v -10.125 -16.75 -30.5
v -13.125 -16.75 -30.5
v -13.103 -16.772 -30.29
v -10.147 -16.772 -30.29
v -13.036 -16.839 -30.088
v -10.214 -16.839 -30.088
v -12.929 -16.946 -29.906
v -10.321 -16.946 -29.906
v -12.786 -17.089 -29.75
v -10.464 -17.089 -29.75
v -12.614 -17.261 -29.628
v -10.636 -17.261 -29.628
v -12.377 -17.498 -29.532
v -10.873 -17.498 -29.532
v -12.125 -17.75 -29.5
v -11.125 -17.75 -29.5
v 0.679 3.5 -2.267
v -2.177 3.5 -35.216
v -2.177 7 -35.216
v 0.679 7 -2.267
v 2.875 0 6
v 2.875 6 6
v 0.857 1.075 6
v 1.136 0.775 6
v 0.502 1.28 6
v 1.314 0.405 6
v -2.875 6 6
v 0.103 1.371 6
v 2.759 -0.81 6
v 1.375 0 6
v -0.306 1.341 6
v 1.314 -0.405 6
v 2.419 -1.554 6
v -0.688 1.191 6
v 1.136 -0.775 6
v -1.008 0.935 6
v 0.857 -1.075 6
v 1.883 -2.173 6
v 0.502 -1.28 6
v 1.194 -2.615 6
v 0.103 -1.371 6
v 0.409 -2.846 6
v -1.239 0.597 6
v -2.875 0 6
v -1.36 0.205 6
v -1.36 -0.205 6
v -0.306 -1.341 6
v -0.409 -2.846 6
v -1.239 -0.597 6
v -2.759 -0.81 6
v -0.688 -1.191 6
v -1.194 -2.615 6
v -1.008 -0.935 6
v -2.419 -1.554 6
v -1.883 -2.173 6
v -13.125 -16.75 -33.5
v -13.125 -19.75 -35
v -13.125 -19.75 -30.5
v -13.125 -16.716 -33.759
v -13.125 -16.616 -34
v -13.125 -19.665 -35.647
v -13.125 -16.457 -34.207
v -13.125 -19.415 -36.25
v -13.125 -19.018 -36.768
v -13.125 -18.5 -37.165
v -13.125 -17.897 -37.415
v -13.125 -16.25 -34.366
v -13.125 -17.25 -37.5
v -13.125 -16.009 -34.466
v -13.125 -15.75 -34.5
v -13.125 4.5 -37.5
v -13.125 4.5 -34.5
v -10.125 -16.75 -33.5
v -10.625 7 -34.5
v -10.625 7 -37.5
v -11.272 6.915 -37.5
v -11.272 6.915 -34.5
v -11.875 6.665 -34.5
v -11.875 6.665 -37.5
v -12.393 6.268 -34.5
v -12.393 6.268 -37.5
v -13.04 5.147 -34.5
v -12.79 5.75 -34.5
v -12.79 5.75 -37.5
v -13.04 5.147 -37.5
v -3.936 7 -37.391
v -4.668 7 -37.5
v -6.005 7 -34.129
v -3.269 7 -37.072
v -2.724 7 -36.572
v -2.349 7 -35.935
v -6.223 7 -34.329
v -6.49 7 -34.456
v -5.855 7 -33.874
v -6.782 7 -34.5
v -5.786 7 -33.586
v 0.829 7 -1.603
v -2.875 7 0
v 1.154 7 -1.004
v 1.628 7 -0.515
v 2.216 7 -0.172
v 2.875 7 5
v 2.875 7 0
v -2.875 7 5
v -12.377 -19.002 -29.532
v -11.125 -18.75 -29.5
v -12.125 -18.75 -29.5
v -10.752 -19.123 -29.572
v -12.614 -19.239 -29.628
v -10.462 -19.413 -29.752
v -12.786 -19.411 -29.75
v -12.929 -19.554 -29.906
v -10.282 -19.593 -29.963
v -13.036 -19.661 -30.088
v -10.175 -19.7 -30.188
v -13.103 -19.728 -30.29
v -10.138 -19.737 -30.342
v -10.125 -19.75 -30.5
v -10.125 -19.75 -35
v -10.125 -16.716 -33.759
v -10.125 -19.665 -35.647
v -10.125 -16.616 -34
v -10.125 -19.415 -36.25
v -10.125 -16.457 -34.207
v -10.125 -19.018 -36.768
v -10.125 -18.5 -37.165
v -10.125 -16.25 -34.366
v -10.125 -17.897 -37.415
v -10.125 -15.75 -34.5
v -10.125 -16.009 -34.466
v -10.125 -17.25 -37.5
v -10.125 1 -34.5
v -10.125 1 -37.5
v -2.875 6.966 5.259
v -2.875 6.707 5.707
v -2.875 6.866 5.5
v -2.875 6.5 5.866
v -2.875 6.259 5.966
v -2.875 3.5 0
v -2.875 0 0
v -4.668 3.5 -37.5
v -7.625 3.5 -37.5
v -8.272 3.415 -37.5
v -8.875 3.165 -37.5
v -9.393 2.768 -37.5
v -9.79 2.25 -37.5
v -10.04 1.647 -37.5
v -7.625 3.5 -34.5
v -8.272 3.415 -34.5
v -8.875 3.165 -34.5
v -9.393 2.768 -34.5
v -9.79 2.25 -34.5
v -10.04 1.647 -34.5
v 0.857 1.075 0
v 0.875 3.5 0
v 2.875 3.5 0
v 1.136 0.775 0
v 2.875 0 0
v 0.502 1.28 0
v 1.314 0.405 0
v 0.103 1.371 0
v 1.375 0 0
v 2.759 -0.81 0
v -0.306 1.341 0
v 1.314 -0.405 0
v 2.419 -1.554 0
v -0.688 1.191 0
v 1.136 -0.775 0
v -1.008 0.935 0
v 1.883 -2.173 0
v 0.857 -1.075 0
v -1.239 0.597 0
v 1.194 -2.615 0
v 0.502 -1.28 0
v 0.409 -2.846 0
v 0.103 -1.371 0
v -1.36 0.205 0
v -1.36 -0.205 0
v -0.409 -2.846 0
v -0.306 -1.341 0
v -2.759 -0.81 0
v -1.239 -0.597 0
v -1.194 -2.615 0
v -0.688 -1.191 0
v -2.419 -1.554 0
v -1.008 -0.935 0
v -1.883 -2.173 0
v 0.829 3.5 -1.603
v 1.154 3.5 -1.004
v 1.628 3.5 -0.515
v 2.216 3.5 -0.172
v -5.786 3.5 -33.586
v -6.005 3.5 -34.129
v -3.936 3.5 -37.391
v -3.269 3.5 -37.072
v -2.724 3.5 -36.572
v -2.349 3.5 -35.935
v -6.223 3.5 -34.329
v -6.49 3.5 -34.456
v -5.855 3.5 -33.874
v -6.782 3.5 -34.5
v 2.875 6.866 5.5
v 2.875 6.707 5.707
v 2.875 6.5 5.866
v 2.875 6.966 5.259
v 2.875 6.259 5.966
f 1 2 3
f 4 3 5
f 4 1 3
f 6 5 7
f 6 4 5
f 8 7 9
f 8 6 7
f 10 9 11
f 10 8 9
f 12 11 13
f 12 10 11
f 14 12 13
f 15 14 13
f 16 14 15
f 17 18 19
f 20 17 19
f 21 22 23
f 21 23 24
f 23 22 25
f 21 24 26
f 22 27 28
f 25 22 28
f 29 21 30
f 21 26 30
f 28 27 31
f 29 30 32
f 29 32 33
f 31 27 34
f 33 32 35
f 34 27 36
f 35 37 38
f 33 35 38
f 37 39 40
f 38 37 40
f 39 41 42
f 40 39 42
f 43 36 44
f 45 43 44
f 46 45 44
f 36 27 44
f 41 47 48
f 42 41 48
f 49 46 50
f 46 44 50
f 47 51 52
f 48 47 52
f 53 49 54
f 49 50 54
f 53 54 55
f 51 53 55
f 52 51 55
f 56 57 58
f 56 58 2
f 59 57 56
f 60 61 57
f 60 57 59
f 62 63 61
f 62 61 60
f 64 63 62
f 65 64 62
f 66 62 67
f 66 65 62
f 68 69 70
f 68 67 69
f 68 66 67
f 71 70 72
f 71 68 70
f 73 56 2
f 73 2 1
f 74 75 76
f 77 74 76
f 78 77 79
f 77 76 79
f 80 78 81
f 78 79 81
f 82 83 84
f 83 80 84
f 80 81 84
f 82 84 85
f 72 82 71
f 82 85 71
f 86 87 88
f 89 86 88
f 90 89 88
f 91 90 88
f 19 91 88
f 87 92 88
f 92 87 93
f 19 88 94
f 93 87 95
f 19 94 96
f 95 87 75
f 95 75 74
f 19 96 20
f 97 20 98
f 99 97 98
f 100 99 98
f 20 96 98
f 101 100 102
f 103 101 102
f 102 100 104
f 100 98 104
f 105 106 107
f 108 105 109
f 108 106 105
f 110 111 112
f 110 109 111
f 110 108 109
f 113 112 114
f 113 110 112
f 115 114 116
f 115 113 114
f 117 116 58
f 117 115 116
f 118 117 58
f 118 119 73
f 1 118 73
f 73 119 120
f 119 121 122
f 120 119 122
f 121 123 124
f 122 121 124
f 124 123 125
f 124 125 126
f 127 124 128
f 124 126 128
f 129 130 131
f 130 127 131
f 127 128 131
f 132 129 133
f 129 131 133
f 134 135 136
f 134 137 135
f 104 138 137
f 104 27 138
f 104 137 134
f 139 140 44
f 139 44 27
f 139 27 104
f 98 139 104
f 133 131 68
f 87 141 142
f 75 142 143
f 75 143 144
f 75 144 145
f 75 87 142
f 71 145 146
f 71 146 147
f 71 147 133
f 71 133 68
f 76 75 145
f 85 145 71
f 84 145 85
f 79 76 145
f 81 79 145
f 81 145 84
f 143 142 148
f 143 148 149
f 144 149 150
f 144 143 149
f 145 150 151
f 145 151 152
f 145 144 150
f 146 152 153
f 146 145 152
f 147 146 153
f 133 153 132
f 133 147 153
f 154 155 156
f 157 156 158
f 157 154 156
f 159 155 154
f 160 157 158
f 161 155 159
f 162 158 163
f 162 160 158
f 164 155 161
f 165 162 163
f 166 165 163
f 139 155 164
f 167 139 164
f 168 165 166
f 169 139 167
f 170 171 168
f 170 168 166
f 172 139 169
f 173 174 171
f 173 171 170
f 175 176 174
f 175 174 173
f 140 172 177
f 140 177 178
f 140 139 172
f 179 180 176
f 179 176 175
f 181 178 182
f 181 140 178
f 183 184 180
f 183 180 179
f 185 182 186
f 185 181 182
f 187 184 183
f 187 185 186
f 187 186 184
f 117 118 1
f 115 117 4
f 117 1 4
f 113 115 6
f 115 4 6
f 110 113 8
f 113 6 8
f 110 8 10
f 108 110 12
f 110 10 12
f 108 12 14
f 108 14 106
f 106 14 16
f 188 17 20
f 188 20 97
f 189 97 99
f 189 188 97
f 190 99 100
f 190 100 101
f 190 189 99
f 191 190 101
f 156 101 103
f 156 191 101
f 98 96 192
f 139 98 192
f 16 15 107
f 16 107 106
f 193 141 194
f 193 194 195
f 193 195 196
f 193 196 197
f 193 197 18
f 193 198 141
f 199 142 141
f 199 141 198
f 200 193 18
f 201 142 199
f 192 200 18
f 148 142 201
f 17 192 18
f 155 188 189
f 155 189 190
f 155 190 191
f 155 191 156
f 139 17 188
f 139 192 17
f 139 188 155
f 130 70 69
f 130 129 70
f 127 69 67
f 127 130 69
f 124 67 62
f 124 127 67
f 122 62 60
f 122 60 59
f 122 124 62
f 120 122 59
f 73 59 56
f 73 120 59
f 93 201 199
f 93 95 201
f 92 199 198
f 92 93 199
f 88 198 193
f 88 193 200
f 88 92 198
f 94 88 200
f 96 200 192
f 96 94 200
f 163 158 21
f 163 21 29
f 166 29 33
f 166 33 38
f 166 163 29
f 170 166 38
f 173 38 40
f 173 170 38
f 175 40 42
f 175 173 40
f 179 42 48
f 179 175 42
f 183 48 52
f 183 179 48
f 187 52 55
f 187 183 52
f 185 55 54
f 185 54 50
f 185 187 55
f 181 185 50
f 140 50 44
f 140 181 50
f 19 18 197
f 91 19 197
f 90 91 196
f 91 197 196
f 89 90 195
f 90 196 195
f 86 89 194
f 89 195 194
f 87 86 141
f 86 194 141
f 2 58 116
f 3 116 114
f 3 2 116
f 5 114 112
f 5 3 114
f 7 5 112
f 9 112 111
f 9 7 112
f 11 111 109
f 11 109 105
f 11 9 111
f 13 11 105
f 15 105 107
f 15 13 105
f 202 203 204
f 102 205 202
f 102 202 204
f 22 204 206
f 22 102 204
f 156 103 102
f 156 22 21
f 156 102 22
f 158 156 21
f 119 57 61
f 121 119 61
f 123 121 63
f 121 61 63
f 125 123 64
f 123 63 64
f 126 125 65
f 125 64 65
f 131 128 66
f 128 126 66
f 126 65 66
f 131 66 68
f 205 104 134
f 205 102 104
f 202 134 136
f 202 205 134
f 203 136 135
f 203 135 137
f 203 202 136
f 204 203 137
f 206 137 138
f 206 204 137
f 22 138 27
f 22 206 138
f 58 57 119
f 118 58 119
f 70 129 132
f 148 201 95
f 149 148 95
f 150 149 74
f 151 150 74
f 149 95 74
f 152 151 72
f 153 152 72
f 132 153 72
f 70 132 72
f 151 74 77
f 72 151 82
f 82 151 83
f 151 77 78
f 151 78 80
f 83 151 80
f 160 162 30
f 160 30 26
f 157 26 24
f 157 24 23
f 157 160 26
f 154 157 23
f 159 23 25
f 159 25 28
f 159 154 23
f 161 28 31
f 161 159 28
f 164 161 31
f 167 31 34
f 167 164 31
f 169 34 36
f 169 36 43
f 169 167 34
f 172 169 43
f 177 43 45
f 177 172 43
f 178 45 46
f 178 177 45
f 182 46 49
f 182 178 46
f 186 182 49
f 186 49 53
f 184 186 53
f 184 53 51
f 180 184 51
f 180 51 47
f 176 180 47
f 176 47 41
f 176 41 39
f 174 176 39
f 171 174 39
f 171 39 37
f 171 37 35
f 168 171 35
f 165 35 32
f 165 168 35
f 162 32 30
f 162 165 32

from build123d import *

# Parameters (mm, degrees)
SKETCH1_R           = 1.375
BOSS_EXTRUDE1_DEPTH = 6
BOSS_EXTRUDE2_START = -13.125
SKETCH9_W           = 3.5
SKETCH9_H           = 3
BOSS_EXTRUDE2_DEPTH = 7.26
BOSS_EXTRUDE3_START = -26.75
SKETCH10_W          = 3
SKETCH10_H          = 3
BOSS_EXTRUDE3_DEPTH = 23.25
SKETCH11_W          = 3
SKETCH11_H          = 3
BOSS_EXTRUDE4_DEPTH = 5
FILLET1_R           = 2.5
FILLET2_R           = 1


with BuildPart() as part:
    # Sketch1 → Boss-Extrude1 (new body)
    with BuildSketch(Plane(origin=(0, 0, 0), x_dir=(0, 1, 0), z_dir=(0, 0, 1))):
        with BuildLine():
            Line((0, 2.875), (7, 2.875))
            Line((7, 2.875), (7, -2.875))
            Line((7, -2.875), (0, -2.875))
            ThreePointArc((0, -2.875), (-2.875, 0), (0, 2.875))
        make_face()
        with Locations(Location((0, 0, 0), (0, 0, 270))):
            Circle(SKETCH1_R, mode=Mode.SUBTRACT)
    extrude(amount=BOSS_EXTRUDE1_DEPTH)

    # Sketch2 → Loft1 section 0
    with BuildSketch(Plane(origin=(0, 0, 0), x_dir=(1, 0, 0), z_dir=(0, 0, -1))):
        with BuildLine():
            Line((0.875, -7), (-2.875, -7))
            Line((-2.875, -7), (-2.875, -3.5))
            Line((-2.875, -3.5), (0.875, -3.5))
            Line((0.875, -3.5), (0.875, -7))
        make_face()
    # Sketch8 → Loft1 section 1
    with BuildSketch(Plane(origin=(0, 0, -37.5), x_dir=(-1, 0, 0), z_dir=(0, 0, -1))):
        with BuildLine():
            Line((2.375, 3.5), (2.375, 7))
            Line((2.375, 7), (6.125, 7))
            Line((6.125, 7), (6.125, 3.5))
            Line((6.125, 3.5), (2.375, 3.5))
        make_face()
    loft()

    # Sketch9 → Boss-Extrude2 (add)
    with BuildSketch(Plane.YZ.offset(BOSS_EXTRUDE2_START)):
        with Locations((5.25, -36)):
            Rectangle(SKETCH9_W, SKETCH9_H)
    extrude(amount=BOSS_EXTRUDE2_DEPTH)

    # Sketch10 → Boss-Extrude3 (add)
    with BuildSketch(Plane(origin=(0, 7, 0), x_dir=(-1, 0, 0), z_dir=(0, 1, 0)).offset(BOSS_EXTRUDE3_START)):
        with Locations((11.625, -36)):
            Rectangle(SKETCH10_W, SKETCH10_H)
    extrude(amount=BOSS_EXTRUDE3_DEPTH)

    # Sketch11 → Boss-Extrude4 (add)
    with BuildSketch(Plane.XY.offset(-34.5)):
        with Locations((-11.625, -18.25)):
            Rectangle(SKETCH11_W, SKETCH11_H)
    extrude(amount=BOSS_EXTRUDE4_DEPTH)

    # Fillet1
    # the kernel refuses this fillet: 2.5 mm, written as the material it adds along each edge
    with BuildSketch(Plane(origin=(-10.125, 3.5, -37.5), x_dir=(1, 0, 0), z_dir=(0, 0, 1))) as fillet1_piece_1:
        with BuildLine():
            CenterArc((FILLET1_R, -FILLET1_R), FILLET1_R, 90, 90)
            Line((0, -FILLET1_R), (0, 0))
            Line((0, 0), (FILLET1_R, 0))
        make_face()
    extrude(amount=3)
    with BuildSketch(Plane(origin=(0.875, 3.5, 0), x_dir=(-0.08634300732914678, 0, -0.9962654691824658), z_dir=(0, 1, 0))) as fillet1_piece_2:
        with BuildLine():
            CenterArc((2.275267243, -2.5), FILLET1_R, 90, 78.288278187)
            Line((-0.172686015, -1.992530938), (0, 0))
            Line((0, 0), (2.275267243, 0))
        make_face()
    extrude(amount=3.5)
    # the kernel refuses this fillet: 2.5 mm, written as the material it takes off along each edge
    with BuildSketch(Plane(origin=(-2.375, -2.231761645, -37.5), x_dir=(-1, 0, 0), z_dir=(0, 1, 0))) as fillet1_2_piece_1:
        with BuildLine():
            CenterArc((FILLET1_R * 0.917081863151, FILLET1_R), FILLET1_R, 184.953257478, 85.046742522)
            Line((-FILLET1_R * 0.0791836060315, FILLET1_R * 0.913656992671), (0, 0))
            Line((0, 0), (FILLET1_R * 0.917081863151, 0))
        make_face()
    extrude(amount=14.963523289, mode=Mode.SUBTRACT)
    with BuildSketch(Plane(origin=(-13.125, 7, -43.75), x_dir=(0, -1, 0), z_dir=(0, 0, 1))) as fillet1_2_piece_2:
        with BuildLine():
            CenterArc((FILLET1_R, FILLET1_R), FILLET1_R, 180, 90)
            Line((0, FILLET1_R), (0, 0))
            Line((0, 0), (FILLET1_R, 0))
        make_face()
    extrude(amount=15.5, mode=Mode.SUBTRACT)
    with BuildSketch(Plane(origin=(-19.375, -19.75, -37.5), x_dir=(0, 0, 1), z_dir=(1, 0, 0))) as fillet1_2_piece_3:
        with BuildLine():
            CenterArc((FILLET1_R, -FILLET1_R), FILLET1_R, 90, 90)
            Line((0, -FILLET1_R), (0, 0))
            Line((0, 0), (FILLET1_R, 0))
        make_face()
    extrude(amount=15.5, mode=Mode.SUBTRACT)

    # Fillet2
    fillet2_edges = [part.edges().sort_by_distance(p)[0] for p in [
        (0, 7, 6),
        (-5.865, 5.25, -34.5),
        (-11.625, -16.75, -34.5),
        (-11.625, -16.75, -29.5),
        (-13.125, -18.25, -29.5),
        (-11.625, -19.75, -29.5),
        (-10.125, -18.25, -29.5),
    ]]
    fillet(fillet2_edges, radius=FILLET2_R)


solid = part.part
